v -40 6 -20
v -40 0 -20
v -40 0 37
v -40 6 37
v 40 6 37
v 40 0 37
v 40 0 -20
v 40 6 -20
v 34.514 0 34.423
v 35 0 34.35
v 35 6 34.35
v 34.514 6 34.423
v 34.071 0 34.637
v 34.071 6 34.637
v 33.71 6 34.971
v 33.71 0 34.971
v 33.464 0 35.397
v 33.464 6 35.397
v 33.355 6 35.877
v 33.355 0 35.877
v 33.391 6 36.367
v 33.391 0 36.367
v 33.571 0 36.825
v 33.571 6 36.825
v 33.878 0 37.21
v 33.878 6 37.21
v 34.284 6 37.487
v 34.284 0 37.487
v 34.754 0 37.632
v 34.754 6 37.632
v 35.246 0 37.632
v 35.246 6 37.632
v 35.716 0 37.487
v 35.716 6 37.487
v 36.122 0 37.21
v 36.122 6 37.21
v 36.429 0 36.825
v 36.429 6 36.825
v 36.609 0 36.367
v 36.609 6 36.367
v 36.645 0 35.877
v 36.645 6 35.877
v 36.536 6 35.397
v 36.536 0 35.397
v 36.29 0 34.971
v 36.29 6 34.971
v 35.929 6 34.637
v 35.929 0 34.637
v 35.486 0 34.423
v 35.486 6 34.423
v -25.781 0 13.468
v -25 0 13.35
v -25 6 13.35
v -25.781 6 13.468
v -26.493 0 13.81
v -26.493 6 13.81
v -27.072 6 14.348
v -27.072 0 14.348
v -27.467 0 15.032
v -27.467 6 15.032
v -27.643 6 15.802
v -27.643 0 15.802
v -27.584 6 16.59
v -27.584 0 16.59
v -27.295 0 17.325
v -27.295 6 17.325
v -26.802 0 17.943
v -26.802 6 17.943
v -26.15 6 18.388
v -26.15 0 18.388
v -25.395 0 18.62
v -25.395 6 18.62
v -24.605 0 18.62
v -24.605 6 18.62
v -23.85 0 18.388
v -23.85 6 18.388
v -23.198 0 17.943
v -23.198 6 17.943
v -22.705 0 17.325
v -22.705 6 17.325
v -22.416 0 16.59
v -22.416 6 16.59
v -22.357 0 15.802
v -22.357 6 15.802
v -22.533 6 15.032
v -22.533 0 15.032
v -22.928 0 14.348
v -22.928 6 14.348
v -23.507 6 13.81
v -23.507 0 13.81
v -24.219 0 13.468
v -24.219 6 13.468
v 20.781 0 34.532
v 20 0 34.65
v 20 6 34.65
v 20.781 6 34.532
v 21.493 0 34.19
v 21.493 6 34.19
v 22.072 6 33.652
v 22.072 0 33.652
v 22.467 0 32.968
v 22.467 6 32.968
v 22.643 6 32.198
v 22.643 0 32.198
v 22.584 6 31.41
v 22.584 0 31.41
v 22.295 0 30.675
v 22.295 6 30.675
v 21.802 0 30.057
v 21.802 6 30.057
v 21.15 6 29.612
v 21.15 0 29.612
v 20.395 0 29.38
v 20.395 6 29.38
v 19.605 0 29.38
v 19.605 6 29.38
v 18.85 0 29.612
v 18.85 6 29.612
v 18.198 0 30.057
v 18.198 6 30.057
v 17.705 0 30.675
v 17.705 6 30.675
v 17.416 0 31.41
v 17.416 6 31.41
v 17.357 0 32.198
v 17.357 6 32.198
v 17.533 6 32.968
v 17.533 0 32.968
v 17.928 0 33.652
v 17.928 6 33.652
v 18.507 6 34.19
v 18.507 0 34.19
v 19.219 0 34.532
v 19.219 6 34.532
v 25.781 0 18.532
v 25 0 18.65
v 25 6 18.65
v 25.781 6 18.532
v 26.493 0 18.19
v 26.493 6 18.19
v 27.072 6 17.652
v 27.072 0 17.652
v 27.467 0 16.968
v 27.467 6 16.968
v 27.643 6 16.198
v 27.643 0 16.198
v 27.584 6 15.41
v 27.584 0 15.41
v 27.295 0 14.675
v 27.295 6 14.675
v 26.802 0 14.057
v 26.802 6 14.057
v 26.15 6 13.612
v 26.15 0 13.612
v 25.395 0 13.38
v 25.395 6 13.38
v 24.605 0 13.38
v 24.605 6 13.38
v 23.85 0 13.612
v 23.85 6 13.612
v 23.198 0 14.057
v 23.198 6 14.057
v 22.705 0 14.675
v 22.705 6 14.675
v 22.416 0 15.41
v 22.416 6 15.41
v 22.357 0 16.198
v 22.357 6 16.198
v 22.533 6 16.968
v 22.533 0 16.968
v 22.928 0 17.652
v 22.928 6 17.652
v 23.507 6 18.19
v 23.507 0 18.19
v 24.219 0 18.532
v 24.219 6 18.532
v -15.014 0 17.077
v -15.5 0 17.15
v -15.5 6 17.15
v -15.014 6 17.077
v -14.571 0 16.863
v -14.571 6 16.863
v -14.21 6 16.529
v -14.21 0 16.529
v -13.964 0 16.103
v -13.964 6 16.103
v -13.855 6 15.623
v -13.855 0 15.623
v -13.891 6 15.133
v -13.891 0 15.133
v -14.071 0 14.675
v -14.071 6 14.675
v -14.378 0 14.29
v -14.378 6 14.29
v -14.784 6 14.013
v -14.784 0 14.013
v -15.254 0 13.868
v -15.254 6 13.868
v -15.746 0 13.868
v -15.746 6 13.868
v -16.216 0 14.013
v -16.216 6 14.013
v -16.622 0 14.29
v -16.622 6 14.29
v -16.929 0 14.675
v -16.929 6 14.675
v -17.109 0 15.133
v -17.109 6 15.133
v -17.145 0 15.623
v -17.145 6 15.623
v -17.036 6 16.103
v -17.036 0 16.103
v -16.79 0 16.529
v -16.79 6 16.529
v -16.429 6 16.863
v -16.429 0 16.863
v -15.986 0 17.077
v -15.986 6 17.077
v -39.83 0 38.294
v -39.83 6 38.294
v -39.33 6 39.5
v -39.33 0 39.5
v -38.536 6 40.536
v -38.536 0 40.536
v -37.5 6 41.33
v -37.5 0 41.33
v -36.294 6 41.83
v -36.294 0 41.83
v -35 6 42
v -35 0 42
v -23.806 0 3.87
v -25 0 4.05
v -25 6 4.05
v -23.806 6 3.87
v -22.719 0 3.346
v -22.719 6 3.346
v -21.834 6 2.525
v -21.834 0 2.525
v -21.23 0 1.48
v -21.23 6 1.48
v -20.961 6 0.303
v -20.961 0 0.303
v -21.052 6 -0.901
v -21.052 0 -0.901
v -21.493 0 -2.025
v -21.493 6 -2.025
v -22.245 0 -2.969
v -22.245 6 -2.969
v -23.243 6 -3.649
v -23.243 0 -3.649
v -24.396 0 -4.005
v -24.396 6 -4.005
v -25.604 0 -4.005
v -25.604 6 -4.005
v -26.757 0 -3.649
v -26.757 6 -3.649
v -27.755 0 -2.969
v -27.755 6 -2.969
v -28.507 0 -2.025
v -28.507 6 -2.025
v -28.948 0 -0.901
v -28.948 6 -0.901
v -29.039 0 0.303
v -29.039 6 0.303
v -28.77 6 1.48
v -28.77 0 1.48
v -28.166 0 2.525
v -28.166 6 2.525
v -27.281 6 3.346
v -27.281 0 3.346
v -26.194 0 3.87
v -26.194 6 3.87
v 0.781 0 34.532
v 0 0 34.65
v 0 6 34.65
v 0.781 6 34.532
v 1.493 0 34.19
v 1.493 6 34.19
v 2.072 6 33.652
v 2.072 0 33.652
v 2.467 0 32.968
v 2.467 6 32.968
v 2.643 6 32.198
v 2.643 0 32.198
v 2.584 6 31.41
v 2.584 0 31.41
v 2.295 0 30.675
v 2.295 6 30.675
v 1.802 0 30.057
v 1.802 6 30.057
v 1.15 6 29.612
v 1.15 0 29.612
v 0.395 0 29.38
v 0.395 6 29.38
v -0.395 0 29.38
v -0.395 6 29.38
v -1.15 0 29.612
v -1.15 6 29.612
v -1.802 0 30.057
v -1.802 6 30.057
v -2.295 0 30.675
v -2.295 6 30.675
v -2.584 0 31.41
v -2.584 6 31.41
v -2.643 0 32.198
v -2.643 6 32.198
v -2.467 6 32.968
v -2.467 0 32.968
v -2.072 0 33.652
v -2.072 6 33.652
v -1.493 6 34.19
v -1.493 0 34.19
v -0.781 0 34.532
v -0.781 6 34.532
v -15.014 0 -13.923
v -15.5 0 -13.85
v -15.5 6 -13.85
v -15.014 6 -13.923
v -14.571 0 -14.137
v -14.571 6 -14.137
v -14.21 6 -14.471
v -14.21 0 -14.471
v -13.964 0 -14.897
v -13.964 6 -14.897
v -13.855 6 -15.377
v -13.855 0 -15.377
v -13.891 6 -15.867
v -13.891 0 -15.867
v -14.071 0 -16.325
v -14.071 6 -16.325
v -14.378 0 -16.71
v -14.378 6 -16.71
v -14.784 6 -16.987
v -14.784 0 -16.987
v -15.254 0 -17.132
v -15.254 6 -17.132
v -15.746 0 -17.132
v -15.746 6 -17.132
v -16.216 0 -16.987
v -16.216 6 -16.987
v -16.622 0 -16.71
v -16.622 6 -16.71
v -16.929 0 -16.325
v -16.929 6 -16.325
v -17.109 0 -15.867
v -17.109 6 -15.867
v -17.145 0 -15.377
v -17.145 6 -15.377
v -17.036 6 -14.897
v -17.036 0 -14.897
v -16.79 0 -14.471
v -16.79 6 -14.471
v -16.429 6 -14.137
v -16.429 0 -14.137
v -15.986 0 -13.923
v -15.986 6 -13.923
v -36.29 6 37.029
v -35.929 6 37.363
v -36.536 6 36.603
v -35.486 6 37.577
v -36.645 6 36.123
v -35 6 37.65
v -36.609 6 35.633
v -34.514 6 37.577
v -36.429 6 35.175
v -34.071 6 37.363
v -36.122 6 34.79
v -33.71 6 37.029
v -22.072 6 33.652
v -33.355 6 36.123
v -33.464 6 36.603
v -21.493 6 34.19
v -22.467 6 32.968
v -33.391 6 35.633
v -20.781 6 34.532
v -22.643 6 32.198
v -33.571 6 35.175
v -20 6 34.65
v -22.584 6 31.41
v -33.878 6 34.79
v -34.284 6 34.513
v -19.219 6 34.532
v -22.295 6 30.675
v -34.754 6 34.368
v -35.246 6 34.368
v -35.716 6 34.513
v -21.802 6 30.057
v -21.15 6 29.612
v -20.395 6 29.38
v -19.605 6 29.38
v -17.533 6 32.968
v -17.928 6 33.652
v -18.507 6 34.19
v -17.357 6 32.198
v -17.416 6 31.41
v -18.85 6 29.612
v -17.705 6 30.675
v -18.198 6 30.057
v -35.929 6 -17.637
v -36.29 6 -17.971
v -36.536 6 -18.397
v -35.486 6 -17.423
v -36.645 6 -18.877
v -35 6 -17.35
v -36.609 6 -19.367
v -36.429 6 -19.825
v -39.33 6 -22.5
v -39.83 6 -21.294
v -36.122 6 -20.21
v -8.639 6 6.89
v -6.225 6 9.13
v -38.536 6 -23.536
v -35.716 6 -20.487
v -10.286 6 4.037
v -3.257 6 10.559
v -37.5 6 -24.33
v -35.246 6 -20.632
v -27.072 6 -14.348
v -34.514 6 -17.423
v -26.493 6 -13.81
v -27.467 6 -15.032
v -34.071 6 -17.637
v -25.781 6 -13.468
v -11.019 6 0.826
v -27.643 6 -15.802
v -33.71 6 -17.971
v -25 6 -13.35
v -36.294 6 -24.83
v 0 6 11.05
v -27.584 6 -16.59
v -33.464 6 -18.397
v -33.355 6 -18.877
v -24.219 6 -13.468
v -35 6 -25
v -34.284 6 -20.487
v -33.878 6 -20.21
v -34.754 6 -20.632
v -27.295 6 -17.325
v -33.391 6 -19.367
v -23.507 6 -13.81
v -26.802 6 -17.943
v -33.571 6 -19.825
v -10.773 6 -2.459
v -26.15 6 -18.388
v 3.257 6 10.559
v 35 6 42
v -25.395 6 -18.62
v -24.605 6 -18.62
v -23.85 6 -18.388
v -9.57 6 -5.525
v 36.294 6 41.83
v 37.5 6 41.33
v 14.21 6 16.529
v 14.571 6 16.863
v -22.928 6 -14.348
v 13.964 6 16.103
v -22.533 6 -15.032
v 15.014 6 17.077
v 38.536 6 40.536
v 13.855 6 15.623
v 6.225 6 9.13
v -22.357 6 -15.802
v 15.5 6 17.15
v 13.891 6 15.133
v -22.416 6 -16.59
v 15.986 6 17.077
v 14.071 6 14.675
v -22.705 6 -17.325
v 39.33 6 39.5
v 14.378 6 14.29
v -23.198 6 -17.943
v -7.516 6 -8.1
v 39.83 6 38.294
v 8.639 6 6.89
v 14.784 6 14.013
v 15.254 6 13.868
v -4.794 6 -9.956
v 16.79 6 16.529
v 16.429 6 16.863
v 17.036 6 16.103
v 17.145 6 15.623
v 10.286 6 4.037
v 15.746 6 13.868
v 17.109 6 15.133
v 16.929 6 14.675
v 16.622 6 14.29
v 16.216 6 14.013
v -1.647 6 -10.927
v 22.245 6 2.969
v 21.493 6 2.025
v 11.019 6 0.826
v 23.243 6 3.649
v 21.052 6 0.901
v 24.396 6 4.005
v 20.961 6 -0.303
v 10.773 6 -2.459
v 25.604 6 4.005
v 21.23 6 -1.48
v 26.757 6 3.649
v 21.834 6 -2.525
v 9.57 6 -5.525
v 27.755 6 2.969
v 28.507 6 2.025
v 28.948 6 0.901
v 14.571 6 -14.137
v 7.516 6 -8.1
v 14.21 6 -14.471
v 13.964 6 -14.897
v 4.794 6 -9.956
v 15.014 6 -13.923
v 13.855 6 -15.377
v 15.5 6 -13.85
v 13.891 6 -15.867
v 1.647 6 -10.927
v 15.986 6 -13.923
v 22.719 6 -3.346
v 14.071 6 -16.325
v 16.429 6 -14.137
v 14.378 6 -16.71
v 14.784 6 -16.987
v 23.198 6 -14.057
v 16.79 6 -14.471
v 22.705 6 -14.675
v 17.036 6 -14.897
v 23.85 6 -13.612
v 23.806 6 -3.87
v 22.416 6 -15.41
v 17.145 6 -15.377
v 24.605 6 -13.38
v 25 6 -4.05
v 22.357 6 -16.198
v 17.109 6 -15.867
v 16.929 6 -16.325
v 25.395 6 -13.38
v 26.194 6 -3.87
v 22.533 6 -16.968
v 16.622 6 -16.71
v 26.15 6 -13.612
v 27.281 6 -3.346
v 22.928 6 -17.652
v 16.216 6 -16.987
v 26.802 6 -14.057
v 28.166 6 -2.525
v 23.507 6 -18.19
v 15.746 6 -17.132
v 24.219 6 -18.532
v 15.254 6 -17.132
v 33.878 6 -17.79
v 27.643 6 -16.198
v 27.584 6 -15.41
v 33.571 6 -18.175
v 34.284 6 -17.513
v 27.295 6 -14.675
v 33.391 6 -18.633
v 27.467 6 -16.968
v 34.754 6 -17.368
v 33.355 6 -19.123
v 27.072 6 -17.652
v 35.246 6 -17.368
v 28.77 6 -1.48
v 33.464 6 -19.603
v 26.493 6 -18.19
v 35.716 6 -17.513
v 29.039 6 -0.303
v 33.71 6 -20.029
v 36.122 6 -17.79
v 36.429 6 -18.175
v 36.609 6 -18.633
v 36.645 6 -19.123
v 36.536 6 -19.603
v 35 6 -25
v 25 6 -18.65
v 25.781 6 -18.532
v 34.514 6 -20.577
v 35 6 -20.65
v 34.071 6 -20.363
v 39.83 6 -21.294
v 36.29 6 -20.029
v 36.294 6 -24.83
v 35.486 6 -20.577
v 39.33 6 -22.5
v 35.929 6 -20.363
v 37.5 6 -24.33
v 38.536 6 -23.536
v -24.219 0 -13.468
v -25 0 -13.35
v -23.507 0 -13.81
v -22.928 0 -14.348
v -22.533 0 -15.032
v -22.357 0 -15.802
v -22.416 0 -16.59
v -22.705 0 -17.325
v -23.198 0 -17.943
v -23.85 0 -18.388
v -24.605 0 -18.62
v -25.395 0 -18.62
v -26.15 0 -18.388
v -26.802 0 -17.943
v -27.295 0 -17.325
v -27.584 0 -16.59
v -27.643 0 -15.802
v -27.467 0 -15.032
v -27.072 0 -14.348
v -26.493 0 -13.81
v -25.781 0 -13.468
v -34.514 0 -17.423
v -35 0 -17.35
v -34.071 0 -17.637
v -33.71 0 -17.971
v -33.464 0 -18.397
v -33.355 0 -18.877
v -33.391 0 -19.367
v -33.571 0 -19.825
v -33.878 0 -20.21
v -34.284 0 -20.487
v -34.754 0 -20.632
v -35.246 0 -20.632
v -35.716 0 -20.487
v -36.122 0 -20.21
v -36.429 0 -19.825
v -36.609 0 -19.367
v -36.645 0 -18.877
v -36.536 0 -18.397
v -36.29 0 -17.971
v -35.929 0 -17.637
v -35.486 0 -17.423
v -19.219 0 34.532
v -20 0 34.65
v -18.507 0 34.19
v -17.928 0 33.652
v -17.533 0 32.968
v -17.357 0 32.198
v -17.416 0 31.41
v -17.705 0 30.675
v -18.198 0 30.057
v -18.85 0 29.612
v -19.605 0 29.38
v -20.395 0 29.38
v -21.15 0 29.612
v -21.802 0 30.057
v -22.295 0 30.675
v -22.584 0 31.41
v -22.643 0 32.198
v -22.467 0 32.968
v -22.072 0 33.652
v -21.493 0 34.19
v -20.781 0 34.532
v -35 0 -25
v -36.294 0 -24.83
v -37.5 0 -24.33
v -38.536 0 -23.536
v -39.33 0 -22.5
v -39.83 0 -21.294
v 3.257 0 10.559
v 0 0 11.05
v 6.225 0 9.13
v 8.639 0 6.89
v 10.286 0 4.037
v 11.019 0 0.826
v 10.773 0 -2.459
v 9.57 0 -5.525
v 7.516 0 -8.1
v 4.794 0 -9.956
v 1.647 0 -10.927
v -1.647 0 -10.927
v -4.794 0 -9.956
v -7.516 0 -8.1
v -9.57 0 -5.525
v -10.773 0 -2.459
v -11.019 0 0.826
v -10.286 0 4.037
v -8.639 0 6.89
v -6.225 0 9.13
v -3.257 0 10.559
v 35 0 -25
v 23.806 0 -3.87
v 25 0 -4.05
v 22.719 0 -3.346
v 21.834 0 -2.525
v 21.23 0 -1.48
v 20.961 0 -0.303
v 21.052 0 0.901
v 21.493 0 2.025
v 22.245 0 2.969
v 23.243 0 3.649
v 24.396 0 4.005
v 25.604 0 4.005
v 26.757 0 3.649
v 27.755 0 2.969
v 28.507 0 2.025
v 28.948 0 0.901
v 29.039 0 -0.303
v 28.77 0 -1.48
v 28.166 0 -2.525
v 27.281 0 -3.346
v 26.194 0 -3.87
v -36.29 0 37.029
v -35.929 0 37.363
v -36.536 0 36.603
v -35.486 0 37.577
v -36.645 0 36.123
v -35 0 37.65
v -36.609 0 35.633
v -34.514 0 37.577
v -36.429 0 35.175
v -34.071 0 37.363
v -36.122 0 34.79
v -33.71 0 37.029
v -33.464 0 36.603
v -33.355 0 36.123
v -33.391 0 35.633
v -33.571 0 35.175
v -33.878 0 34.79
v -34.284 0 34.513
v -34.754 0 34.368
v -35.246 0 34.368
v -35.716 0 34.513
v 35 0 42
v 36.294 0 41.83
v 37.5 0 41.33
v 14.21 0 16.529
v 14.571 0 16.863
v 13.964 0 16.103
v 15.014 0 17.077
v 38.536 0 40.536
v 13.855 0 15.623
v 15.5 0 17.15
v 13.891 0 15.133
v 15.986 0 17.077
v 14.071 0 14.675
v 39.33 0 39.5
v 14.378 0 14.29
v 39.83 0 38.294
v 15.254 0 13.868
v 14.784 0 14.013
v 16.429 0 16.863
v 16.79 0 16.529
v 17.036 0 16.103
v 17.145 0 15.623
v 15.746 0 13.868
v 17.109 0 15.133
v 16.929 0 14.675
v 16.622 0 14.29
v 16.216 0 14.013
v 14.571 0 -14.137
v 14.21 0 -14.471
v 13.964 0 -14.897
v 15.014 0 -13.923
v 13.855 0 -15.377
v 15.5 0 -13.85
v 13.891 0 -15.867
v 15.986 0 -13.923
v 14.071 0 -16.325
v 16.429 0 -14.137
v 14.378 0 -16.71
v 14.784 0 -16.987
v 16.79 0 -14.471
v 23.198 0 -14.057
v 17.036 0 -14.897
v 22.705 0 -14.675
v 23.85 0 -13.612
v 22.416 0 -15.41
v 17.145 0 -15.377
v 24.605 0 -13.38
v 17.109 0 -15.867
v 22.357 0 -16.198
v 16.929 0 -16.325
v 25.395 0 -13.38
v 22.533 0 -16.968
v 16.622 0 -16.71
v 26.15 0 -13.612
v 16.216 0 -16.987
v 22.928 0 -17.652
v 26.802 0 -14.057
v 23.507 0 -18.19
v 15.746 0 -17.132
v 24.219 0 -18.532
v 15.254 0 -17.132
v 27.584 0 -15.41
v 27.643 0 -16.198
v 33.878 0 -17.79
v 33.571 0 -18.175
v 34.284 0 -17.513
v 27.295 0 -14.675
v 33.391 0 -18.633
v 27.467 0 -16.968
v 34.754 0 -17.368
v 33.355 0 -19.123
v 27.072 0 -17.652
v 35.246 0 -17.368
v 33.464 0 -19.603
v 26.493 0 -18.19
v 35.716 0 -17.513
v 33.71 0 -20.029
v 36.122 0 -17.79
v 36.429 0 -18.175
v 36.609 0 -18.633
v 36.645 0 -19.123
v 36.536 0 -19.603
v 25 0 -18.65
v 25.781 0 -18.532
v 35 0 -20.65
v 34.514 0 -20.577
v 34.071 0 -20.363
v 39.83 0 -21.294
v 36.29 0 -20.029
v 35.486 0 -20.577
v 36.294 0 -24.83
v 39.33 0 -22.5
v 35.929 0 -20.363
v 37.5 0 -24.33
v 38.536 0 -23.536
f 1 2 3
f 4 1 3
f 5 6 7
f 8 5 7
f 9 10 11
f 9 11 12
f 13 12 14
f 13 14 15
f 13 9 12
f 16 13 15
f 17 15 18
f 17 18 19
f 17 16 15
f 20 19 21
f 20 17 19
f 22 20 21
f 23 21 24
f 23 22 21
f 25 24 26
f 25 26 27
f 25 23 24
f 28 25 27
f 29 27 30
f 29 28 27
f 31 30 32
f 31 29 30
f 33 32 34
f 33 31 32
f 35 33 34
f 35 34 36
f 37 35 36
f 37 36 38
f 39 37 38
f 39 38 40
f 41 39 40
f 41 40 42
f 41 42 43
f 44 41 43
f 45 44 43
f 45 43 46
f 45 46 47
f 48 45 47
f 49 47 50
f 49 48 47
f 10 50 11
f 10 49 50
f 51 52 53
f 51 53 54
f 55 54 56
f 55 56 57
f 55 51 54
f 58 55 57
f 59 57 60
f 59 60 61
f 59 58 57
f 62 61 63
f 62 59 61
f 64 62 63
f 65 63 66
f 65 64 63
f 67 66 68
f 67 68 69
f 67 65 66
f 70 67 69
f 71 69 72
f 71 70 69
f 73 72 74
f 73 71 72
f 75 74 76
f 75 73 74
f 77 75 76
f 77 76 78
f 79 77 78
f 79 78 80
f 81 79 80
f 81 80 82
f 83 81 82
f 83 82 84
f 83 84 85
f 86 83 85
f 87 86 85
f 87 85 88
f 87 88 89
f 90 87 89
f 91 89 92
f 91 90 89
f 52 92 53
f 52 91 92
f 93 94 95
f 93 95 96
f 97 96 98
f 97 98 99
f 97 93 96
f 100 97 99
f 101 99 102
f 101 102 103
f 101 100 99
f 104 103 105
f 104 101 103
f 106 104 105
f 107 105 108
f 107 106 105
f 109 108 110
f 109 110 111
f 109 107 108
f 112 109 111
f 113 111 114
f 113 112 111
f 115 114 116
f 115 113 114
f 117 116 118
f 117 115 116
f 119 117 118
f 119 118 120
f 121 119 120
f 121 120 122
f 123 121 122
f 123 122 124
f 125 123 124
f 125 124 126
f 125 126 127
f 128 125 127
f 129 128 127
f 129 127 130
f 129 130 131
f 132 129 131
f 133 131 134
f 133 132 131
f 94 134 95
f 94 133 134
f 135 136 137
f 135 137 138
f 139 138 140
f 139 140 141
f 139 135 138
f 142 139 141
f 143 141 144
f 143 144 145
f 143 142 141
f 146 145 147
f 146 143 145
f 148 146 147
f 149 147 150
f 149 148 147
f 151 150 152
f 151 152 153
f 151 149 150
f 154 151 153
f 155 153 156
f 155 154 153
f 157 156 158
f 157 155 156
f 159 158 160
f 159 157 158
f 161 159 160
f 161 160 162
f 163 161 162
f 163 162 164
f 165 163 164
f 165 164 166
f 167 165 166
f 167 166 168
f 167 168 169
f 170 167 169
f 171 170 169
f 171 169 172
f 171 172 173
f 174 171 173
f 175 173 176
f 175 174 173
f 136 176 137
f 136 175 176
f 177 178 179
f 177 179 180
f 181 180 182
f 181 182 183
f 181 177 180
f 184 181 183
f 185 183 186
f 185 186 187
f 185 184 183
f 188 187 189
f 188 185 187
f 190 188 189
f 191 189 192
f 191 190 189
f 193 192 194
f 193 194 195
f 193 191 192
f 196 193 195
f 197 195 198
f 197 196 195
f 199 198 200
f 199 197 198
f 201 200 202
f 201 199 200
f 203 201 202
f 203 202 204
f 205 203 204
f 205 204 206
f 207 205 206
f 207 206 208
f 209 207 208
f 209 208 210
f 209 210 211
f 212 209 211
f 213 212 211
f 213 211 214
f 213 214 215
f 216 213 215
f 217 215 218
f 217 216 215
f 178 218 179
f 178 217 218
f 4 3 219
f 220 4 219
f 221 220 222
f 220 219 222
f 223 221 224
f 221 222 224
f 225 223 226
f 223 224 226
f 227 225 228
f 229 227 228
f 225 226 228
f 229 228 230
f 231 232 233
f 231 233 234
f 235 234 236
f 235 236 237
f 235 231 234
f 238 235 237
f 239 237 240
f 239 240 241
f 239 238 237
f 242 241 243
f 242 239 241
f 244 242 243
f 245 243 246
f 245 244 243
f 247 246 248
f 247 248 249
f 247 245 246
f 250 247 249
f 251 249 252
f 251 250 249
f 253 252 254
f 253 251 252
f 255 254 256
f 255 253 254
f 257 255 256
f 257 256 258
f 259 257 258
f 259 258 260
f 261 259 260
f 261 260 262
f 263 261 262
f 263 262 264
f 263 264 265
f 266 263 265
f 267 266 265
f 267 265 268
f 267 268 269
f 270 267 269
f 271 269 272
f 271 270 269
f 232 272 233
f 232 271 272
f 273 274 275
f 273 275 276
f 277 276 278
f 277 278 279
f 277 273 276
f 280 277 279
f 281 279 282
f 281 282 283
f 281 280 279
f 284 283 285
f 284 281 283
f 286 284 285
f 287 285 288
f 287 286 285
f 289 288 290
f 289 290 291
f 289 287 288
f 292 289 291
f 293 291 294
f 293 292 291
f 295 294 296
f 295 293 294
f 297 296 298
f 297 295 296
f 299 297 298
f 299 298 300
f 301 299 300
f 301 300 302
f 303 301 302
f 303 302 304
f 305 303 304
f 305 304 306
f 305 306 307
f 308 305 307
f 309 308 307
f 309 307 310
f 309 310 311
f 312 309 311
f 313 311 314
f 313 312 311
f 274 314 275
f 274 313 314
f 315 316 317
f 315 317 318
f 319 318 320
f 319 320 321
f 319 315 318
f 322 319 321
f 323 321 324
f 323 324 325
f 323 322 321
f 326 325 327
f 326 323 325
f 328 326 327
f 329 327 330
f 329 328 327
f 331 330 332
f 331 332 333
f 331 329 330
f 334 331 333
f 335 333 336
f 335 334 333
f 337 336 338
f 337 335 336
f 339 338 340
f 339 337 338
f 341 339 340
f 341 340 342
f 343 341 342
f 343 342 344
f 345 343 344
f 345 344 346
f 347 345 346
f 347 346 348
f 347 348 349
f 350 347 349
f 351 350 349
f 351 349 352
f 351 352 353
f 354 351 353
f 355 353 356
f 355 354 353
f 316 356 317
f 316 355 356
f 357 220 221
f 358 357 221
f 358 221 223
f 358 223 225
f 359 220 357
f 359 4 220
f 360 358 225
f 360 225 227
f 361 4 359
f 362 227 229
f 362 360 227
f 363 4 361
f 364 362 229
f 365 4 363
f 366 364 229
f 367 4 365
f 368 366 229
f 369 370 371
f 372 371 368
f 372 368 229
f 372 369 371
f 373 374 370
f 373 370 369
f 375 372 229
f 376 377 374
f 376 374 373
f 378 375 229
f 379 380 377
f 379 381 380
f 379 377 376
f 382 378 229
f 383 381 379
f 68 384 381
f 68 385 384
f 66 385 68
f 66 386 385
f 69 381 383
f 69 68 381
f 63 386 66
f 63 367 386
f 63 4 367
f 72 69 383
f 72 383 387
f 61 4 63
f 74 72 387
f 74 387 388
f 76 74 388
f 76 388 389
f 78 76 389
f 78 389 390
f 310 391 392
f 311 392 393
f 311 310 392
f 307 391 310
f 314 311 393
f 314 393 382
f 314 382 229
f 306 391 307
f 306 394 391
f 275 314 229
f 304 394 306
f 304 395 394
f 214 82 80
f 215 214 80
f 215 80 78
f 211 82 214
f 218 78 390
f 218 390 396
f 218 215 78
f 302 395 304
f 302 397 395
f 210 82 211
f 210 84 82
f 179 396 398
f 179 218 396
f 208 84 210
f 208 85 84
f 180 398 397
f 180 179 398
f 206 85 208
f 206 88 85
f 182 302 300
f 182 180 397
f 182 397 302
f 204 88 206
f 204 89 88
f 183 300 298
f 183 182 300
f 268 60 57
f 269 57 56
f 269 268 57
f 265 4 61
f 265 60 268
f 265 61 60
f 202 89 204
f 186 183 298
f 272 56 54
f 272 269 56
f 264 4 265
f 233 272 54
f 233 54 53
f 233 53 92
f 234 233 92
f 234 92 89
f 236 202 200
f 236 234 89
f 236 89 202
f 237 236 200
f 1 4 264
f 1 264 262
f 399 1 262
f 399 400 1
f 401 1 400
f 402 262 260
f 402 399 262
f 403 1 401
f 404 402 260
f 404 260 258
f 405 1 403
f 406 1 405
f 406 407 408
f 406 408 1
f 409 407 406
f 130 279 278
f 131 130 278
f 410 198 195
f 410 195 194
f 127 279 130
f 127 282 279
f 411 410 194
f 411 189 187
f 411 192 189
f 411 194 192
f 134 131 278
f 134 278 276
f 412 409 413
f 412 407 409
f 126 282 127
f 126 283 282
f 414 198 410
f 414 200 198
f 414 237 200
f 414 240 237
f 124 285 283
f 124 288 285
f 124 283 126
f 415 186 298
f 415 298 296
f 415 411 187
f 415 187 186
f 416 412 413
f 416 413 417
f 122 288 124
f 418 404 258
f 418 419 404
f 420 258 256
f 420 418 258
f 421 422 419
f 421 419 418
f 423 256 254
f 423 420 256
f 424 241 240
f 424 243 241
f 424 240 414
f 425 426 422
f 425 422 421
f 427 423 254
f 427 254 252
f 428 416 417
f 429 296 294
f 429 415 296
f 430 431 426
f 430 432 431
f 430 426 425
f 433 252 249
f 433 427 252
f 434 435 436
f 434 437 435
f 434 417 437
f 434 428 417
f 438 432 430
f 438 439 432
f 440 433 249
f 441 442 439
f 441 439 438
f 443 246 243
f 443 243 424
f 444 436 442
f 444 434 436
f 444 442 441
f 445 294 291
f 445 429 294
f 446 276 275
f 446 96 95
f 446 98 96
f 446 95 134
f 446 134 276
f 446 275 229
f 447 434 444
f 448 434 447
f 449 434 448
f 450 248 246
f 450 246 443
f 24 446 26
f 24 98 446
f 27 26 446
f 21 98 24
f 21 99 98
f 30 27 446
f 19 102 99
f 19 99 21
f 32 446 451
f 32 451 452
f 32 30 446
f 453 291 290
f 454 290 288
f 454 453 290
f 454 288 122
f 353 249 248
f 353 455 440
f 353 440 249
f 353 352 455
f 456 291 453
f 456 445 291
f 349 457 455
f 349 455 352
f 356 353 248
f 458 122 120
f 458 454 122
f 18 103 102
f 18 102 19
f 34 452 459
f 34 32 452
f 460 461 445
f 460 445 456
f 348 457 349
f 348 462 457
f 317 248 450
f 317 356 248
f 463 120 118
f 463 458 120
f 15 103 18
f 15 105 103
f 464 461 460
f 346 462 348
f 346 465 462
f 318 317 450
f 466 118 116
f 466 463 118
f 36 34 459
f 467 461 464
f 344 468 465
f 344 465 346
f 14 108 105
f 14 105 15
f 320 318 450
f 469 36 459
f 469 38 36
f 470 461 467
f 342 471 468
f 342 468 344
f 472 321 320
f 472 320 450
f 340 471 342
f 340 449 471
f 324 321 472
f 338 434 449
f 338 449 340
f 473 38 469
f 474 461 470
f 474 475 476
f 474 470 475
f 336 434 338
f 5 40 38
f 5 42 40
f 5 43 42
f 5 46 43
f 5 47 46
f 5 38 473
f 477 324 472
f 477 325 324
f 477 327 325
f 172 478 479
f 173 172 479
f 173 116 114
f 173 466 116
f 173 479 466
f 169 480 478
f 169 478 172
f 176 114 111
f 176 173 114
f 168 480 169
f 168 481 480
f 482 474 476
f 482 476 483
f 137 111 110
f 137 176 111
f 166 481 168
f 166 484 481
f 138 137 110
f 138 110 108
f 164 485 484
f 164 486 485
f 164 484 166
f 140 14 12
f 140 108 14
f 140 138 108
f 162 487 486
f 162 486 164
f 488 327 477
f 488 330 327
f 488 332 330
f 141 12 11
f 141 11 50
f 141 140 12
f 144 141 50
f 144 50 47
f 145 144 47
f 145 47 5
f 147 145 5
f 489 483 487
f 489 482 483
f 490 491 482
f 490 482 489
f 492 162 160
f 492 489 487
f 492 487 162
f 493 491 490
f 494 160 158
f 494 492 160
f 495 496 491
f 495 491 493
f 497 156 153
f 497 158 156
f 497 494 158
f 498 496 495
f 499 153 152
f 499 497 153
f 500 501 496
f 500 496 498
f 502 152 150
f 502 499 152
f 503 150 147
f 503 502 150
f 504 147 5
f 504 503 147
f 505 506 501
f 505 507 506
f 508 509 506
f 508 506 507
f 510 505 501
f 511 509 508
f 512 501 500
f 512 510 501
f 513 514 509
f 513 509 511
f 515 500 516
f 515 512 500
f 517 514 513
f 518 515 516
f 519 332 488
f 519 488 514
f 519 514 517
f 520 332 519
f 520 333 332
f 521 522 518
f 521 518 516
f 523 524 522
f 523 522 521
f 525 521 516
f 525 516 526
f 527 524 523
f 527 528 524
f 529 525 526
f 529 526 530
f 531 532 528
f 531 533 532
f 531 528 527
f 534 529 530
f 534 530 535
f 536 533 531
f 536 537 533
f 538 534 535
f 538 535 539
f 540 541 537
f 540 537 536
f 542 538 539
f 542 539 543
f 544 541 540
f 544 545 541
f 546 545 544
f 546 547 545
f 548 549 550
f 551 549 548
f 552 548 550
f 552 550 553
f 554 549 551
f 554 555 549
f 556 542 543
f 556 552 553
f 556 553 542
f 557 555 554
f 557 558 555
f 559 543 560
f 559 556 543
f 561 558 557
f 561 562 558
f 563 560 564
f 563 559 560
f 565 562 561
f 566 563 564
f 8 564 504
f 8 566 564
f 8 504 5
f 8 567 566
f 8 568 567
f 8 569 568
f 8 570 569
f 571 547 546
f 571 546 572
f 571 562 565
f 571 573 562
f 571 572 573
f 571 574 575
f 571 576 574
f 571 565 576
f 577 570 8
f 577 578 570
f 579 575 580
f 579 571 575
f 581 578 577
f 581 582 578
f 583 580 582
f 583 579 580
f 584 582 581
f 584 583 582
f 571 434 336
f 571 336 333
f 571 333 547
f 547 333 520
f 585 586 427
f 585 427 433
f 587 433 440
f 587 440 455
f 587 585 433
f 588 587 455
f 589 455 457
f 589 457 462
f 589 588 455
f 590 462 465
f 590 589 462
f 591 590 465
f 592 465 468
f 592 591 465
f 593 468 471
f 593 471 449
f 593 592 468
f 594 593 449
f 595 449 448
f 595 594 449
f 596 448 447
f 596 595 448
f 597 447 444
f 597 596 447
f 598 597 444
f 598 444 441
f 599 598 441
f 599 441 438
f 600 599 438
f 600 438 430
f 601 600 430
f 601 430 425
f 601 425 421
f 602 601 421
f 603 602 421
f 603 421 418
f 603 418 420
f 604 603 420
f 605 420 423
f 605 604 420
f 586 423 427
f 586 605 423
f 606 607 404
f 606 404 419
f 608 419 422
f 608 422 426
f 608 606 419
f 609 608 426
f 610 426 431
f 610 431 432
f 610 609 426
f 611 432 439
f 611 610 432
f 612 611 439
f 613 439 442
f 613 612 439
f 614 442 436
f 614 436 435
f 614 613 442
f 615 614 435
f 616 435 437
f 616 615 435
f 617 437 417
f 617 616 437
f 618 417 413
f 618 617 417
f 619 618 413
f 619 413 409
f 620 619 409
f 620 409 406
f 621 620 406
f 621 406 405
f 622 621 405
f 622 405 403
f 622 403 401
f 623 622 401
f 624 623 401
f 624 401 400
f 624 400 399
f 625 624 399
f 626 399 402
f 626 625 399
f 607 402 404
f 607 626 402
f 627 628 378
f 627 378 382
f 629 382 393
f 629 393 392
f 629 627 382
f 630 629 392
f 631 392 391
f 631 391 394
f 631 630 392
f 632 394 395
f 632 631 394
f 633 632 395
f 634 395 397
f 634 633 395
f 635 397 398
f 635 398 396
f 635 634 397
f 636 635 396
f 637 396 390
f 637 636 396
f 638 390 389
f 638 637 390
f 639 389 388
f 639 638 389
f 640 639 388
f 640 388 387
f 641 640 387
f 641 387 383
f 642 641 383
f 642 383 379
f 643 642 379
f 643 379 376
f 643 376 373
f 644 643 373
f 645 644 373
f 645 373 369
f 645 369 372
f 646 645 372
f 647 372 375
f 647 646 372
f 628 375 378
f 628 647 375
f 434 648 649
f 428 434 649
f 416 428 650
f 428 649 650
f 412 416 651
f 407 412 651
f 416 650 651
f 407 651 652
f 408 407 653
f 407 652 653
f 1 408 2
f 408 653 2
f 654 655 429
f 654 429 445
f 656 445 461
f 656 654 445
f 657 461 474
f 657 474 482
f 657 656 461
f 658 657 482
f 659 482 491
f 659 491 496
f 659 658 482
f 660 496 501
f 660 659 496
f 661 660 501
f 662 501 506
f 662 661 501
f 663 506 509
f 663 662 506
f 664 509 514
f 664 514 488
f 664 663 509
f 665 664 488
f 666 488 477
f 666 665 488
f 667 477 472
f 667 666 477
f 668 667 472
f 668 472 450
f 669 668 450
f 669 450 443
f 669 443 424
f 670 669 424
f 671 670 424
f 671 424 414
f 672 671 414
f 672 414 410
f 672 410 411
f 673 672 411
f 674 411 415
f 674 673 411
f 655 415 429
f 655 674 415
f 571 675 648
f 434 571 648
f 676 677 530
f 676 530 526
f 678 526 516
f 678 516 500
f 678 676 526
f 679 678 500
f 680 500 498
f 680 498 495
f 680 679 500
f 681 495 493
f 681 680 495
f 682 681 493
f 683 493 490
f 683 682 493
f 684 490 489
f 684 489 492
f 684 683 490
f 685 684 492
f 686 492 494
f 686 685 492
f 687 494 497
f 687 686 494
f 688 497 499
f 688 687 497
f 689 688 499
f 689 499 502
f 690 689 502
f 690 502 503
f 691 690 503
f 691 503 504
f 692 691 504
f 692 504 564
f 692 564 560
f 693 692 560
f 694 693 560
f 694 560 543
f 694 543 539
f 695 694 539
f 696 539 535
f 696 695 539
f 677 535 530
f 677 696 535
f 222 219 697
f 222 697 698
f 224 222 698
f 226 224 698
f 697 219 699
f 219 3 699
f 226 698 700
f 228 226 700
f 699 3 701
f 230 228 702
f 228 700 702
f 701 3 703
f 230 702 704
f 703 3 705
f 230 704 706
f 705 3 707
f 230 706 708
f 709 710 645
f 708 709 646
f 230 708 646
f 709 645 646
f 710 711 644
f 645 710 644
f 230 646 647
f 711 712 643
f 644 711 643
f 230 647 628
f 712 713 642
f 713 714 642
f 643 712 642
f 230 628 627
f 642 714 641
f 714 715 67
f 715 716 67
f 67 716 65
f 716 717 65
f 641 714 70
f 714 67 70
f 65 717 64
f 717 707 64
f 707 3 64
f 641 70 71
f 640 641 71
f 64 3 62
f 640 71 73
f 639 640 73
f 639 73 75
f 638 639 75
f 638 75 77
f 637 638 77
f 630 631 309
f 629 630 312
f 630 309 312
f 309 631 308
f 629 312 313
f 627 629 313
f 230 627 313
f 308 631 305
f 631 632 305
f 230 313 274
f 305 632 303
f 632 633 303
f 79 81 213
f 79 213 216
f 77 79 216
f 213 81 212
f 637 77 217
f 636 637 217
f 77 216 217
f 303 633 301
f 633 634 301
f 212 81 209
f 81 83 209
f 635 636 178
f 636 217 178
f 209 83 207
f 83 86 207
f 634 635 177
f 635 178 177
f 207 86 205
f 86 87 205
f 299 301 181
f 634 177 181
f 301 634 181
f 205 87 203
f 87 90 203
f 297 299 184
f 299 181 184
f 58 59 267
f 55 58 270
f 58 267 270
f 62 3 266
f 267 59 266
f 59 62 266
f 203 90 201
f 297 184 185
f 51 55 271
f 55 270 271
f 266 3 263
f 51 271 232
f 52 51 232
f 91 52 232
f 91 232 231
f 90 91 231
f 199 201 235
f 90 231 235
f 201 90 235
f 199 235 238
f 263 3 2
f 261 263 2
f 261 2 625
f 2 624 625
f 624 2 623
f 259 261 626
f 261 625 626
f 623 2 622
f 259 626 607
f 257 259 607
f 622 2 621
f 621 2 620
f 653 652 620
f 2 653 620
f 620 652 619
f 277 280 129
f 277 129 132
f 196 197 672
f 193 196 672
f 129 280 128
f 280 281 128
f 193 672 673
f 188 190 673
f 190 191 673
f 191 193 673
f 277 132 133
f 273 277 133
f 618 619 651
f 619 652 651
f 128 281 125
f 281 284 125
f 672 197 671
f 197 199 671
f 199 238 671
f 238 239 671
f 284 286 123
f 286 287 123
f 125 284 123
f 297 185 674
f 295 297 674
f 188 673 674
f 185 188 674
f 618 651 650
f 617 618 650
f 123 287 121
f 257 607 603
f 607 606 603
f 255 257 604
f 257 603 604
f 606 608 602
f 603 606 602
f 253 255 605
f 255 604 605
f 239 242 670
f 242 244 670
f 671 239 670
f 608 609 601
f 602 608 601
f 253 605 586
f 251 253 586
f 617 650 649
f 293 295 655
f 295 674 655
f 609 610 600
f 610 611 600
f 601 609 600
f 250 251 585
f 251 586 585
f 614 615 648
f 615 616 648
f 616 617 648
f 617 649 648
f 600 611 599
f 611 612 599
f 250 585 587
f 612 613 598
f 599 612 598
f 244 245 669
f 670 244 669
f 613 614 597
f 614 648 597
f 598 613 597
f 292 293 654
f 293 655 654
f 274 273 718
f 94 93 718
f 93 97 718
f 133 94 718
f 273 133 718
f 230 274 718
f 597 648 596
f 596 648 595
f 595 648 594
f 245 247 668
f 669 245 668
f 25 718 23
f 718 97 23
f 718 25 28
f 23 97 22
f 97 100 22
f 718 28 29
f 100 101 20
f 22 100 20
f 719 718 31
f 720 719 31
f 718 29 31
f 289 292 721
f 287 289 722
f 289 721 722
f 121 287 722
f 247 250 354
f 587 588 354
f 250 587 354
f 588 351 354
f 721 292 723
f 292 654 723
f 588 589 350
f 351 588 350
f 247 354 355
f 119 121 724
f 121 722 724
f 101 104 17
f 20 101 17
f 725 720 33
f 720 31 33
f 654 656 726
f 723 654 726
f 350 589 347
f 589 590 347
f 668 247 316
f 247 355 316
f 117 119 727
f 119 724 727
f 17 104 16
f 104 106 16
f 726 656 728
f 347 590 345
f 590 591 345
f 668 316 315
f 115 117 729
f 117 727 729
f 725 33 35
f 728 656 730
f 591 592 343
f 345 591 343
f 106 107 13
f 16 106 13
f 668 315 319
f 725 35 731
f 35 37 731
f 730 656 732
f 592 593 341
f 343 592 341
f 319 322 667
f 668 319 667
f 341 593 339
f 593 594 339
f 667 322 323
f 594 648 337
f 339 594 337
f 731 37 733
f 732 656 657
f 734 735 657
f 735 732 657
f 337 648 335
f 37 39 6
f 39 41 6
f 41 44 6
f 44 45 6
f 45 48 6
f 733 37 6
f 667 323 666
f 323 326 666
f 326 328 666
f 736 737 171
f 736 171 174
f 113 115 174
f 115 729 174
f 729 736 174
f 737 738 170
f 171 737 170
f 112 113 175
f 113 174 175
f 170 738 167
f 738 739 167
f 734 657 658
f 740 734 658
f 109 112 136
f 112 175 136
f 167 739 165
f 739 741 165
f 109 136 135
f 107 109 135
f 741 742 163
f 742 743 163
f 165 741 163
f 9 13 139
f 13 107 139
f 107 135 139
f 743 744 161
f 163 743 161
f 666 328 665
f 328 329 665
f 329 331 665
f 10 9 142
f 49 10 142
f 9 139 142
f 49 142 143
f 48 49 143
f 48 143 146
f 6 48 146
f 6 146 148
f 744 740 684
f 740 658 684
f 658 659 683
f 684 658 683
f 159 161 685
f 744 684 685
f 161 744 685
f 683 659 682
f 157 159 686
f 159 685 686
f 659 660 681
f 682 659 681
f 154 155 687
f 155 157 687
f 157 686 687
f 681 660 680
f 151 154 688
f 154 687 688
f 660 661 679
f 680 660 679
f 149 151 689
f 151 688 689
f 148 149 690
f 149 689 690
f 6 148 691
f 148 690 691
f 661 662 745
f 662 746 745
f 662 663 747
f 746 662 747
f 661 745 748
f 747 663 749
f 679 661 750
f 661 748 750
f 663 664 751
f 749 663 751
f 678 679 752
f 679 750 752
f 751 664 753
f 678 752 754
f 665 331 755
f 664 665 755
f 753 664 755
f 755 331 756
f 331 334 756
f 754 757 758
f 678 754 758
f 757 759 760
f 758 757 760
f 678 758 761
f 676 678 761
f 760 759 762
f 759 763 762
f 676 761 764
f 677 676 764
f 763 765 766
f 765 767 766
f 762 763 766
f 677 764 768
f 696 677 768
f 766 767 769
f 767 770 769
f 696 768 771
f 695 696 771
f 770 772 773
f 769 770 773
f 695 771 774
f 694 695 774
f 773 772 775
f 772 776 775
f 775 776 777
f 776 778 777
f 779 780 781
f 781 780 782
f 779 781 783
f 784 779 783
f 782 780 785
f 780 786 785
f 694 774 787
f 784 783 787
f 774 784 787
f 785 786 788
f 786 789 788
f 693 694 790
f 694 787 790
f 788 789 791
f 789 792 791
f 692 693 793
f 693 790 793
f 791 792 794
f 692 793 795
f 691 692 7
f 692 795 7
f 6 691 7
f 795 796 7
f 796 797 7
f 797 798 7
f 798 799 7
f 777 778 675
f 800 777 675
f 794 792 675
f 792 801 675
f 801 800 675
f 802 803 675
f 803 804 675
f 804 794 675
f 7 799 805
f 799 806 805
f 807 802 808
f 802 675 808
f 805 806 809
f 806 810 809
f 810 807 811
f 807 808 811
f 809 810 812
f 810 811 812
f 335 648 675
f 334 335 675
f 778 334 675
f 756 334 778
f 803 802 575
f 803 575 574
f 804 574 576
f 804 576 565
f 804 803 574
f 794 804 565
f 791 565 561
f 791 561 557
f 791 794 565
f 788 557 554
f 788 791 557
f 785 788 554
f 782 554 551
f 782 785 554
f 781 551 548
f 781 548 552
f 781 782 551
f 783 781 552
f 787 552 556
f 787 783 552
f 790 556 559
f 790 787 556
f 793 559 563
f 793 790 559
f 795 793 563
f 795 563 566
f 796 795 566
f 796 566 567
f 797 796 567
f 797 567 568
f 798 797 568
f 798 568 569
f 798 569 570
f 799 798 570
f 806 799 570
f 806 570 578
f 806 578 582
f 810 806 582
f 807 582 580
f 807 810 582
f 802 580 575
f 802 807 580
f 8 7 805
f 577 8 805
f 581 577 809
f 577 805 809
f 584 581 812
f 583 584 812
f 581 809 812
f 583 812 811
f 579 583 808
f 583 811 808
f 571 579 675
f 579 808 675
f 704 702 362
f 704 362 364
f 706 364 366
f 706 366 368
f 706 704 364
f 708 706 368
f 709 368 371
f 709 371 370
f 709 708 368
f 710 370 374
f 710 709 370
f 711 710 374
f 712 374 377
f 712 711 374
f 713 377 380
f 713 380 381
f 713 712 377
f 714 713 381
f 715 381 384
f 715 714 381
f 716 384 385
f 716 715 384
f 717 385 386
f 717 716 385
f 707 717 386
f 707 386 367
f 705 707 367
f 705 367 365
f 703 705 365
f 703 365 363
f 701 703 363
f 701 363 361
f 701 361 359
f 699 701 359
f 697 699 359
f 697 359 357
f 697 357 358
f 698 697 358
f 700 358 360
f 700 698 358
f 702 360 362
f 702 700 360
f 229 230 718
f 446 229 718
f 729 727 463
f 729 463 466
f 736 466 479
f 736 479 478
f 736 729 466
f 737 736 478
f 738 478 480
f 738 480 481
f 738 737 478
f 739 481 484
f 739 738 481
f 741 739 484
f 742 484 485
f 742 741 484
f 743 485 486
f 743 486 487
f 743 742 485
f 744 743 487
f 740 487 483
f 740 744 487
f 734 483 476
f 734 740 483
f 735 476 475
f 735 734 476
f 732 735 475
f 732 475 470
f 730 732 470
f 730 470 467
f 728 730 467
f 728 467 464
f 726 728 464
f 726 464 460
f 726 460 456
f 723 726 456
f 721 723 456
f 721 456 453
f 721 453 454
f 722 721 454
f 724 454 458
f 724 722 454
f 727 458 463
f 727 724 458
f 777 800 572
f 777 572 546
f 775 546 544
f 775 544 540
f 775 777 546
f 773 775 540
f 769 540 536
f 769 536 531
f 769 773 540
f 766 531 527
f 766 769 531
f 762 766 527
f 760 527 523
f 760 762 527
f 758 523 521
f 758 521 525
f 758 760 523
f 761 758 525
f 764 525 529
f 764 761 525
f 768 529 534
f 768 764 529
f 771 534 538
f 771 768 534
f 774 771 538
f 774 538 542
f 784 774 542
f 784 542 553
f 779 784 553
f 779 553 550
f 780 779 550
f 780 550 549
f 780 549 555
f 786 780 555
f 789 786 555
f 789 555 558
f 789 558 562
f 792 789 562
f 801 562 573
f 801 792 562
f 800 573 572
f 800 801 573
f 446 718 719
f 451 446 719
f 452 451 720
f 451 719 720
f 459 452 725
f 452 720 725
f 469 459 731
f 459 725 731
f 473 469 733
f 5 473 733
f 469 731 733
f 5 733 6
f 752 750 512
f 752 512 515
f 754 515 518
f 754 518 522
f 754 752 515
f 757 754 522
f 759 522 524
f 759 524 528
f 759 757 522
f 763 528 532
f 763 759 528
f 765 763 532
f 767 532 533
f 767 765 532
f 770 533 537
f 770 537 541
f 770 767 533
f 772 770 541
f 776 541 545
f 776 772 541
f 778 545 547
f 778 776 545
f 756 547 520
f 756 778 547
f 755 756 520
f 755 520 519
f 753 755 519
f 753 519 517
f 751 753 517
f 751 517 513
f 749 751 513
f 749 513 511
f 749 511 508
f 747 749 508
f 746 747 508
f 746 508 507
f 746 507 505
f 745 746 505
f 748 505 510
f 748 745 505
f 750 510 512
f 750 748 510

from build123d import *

# Parameters (mm, degrees)
SKETCH_1_R      = 11.05
SKETCH_1_R_2    = 1.65
SKETCH_1_R_3    = 4.05
SKETCH_1_R_4    = 2.65
EXTRUDE_1_DEPTH = 6


with BuildPart() as part:
    # 草图1 → 凸台-拉伸1 (new body)
    with BuildSketch(Plane(origin=(0, 0, 0), x_dir=(1, 0, 0), z_dir=(0, 1, 0))):
        with BuildLine():
            Line((-35, -42), (35, -42))
            ThreePointArc((35, -42), (38.535533906, -40.535533906), (40, -37))
            Line((40, -37), (40, 20))
            ThreePointArc((40, 20), (38.535533906, 23.535533906), (35, 25))
            Line((35, 25), (-35, 25))
            ThreePointArc((-35, 25), (-38.535533906, 23.535533906), (-40, 20))
            Line((-40, 20), (-40, -37))
            ThreePointArc((-40, -37), (-38.535533906, -40.535533906), (-35, -42))
        make_face()
        with Locations(Location((0, 0, 0), (0, 0, 270))):
            Circle(SKETCH_1_R, mode=Mode.SUBTRACT)
        with Locations(Location((-15.5, 15.5, 0), (0, 0, 270))):
            Circle(SKETCH_1_R_2, mode=Mode.SUBTRACT)
        with Locations(Location((15.5, 15.5, 0), (0, 0, 270))):
            Circle(SKETCH_1_R_2, mode=Mode.SUBTRACT)
        with Locations(Location((15.5, -15.5, 0), (0, 0, 270))):
            Circle(SKETCH_1_R_2, mode=Mode.SUBTRACT)
        with Locations(Location((-15.5, -15.5, 0), (0, 0, 270))):
            Circle(SKETCH_1_R_2, mode=Mode.SUBTRACT)
        with Locations(Location((-25, 0, 0), (0, 0, 270))):
            Circle(SKETCH_1_R_3, mode=Mode.SUBTRACT)
        with Locations(Location((-25, 16, 0), (0, 0, 270))):
            Circle(SKETCH_1_R_4, mode=Mode.SUBTRACT)
        with Locations(Location((-25, -16, 0), (0, 0, 90))):
            Circle(SKETCH_1_R_4, mode=Mode.SUBTRACT)
        with Locations(Location((25, 0, 0), (0, 0, 90))):
            Circle(SKETCH_1_R_3, mode=Mode.SUBTRACT)
        with Locations(Location((25, -16, 0), (0, 0, 270))):
            Circle(SKETCH_1_R_4, mode=Mode.SUBTRACT)
        with Locations(Location((25, 16, 0), (0, 0, 90))):
            Circle(SKETCH_1_R_4, mode=Mode.SUBTRACT)
        with Locations(Location((-20, -32, 0), (0, 0, 270))):
            Circle(SKETCH_1_R_4, mode=Mode.SUBTRACT)
        with Locations(Location((0, -32, 0), (0, 0, 270))):
            Circle(SKETCH_1_R_4, mode=Mode.SUBTRACT)
        with Locations(Location((20, -32, 0), (0, 0, 270))):
            Circle(SKETCH_1_R_4, mode=Mode.SUBTRACT)
        with Locations(Location((-35, 19, 0), (0, 0, 270))):
            Circle(SKETCH_1_R_2, mode=Mode.SUBTRACT)
        with Locations(Location((-35, -36, 0), (0, 0, 270))):
            Circle(SKETCH_1_R_2, mode=Mode.SUBTRACT)
        with Locations(Location((35, -36, 0), (0, 0, 90))):
            Circle(SKETCH_1_R_2, mode=Mode.SUBTRACT)
        with Locations(Location((35, 19, 0), (0, 0, 90))):
            Circle(SKETCH_1_R_2, mode=Mode.SUBTRACT)
    extrude(amount=EXTRUDE_1_DEPTH)


solid = part.part
